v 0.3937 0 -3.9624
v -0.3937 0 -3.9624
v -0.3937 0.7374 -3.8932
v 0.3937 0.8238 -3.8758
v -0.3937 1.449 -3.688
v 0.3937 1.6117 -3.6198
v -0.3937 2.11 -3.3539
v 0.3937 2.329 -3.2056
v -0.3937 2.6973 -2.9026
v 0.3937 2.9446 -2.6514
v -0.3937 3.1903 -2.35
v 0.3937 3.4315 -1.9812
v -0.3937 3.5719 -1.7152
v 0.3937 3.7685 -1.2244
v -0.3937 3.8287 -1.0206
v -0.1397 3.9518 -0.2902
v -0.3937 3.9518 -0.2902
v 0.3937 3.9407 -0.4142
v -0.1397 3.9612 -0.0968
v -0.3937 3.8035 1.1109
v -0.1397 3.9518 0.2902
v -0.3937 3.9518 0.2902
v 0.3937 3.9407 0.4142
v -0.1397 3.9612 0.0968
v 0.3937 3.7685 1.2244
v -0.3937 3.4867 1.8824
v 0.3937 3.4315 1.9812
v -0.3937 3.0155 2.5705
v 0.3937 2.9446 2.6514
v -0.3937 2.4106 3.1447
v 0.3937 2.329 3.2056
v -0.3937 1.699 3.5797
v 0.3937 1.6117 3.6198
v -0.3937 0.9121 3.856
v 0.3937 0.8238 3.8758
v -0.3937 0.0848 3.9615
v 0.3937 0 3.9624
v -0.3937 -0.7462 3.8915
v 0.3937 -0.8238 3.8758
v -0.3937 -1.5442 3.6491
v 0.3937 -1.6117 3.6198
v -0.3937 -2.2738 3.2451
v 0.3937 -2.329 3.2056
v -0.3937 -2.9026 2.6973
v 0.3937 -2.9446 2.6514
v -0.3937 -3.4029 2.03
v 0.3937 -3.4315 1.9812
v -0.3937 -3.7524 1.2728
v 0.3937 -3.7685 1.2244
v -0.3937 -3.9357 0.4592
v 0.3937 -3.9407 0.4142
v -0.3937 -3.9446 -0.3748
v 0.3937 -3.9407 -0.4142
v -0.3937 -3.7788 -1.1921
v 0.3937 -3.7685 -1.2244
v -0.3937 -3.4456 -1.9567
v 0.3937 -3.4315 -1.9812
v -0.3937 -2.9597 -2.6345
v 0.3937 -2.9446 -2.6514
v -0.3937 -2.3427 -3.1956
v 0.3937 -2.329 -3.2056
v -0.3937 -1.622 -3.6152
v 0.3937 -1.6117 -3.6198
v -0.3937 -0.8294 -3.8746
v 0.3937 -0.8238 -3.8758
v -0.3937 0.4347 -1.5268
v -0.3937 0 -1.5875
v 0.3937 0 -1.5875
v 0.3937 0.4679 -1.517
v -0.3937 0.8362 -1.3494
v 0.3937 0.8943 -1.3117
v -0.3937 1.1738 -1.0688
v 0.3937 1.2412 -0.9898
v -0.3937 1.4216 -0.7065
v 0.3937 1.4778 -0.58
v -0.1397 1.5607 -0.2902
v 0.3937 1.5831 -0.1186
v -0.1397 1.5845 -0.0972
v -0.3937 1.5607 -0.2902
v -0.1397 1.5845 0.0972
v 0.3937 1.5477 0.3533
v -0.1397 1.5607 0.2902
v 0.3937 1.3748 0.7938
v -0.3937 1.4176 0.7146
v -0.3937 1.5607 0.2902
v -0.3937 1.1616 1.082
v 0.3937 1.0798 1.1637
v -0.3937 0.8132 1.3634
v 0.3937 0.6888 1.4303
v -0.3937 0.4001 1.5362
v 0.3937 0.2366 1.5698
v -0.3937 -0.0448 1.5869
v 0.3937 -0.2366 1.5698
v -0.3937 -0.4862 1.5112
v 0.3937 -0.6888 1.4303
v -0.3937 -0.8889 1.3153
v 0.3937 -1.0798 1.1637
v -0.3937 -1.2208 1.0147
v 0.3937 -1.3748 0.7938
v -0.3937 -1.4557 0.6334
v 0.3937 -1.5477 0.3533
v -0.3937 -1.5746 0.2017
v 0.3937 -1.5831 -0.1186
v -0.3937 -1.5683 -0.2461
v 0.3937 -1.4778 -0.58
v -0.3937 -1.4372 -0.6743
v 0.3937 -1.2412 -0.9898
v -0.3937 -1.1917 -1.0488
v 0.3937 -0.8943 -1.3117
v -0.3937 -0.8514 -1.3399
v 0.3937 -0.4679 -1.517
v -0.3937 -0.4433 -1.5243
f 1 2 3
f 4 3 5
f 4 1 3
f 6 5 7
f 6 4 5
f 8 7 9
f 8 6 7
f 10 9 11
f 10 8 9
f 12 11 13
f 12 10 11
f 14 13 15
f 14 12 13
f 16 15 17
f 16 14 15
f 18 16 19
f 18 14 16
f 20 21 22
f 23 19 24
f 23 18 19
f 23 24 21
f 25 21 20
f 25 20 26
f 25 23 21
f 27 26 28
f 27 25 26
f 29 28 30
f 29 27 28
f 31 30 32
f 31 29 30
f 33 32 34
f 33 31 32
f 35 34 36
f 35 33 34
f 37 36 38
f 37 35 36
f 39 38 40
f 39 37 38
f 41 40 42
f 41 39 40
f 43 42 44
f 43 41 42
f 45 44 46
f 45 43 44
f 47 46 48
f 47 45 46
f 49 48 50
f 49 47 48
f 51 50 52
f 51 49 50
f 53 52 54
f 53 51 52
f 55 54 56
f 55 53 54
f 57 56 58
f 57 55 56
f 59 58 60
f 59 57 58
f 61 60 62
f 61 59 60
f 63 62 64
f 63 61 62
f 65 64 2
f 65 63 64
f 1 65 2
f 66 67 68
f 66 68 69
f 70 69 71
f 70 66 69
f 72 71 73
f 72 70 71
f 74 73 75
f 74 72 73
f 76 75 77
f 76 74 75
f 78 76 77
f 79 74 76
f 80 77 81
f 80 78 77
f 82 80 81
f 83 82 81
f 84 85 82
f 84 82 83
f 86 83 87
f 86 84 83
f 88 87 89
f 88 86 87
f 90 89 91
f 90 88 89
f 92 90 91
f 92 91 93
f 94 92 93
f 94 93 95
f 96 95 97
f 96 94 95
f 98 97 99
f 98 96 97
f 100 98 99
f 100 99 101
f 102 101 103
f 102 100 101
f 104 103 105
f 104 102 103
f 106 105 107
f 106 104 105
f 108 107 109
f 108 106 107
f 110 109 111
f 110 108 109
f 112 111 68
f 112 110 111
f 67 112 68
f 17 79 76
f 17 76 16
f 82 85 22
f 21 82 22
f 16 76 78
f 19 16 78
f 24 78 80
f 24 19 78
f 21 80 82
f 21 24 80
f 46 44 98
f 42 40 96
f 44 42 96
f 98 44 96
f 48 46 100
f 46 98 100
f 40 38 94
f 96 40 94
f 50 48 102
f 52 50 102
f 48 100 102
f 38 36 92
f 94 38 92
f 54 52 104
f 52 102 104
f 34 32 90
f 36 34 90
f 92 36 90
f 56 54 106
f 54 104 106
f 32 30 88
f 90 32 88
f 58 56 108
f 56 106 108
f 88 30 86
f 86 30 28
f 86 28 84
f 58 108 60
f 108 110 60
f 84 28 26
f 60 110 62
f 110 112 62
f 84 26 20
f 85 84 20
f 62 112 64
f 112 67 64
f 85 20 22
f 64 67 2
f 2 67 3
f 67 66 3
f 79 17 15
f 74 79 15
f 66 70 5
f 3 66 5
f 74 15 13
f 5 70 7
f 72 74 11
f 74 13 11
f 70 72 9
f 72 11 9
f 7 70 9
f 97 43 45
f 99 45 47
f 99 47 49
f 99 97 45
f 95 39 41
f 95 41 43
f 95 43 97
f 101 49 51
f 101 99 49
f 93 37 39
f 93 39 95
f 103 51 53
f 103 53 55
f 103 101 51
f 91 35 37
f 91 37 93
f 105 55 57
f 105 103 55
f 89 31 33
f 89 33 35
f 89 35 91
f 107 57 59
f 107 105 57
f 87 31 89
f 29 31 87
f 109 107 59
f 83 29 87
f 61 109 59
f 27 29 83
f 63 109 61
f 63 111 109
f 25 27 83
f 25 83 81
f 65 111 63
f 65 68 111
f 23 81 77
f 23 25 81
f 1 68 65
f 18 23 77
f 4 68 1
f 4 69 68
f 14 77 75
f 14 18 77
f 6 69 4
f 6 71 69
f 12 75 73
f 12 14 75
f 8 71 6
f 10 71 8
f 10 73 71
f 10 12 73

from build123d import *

# Parameters (mm, degrees)
SKETCH1_R           = 3.9624
SKETCH1_R_2         = 1.5875
BOSS_EXTRUDE1_DEPTH = 0.3937
SKETCH5_W           = 0.58047107
SKETCH5_H           = 3.9624
CUT_EXTRUDE1_DEPTH  = 0.254


with BuildPart() as part:
    # Sketch1 → Boss-Extrude1 (new, symmetric)
    with BuildSketch(Plane(origin=(0, 0, 0), x_dir=(0, 0, -1), z_dir=(1, 0, 0))):
        Circle(SKETCH1_R)
        Circle(SKETCH1_R_2, mode=Mode.SUBTRACT)
    extrude(amount=BOSS_EXTRUDE1_DEPTH, both=True)

    # Sketch5 → Cut-Extrude1 (cut)
    with BuildSketch(Plane.ZY.offset(0.3937)):
        with Locations((0, 1.9812)):
            Rectangle(SKETCH5_W, SKETCH5_H)
    extrude(amount=-CUT_EXTRUDE1_DEPTH, mode=Mode.SUBTRACT)


solid = part.part
